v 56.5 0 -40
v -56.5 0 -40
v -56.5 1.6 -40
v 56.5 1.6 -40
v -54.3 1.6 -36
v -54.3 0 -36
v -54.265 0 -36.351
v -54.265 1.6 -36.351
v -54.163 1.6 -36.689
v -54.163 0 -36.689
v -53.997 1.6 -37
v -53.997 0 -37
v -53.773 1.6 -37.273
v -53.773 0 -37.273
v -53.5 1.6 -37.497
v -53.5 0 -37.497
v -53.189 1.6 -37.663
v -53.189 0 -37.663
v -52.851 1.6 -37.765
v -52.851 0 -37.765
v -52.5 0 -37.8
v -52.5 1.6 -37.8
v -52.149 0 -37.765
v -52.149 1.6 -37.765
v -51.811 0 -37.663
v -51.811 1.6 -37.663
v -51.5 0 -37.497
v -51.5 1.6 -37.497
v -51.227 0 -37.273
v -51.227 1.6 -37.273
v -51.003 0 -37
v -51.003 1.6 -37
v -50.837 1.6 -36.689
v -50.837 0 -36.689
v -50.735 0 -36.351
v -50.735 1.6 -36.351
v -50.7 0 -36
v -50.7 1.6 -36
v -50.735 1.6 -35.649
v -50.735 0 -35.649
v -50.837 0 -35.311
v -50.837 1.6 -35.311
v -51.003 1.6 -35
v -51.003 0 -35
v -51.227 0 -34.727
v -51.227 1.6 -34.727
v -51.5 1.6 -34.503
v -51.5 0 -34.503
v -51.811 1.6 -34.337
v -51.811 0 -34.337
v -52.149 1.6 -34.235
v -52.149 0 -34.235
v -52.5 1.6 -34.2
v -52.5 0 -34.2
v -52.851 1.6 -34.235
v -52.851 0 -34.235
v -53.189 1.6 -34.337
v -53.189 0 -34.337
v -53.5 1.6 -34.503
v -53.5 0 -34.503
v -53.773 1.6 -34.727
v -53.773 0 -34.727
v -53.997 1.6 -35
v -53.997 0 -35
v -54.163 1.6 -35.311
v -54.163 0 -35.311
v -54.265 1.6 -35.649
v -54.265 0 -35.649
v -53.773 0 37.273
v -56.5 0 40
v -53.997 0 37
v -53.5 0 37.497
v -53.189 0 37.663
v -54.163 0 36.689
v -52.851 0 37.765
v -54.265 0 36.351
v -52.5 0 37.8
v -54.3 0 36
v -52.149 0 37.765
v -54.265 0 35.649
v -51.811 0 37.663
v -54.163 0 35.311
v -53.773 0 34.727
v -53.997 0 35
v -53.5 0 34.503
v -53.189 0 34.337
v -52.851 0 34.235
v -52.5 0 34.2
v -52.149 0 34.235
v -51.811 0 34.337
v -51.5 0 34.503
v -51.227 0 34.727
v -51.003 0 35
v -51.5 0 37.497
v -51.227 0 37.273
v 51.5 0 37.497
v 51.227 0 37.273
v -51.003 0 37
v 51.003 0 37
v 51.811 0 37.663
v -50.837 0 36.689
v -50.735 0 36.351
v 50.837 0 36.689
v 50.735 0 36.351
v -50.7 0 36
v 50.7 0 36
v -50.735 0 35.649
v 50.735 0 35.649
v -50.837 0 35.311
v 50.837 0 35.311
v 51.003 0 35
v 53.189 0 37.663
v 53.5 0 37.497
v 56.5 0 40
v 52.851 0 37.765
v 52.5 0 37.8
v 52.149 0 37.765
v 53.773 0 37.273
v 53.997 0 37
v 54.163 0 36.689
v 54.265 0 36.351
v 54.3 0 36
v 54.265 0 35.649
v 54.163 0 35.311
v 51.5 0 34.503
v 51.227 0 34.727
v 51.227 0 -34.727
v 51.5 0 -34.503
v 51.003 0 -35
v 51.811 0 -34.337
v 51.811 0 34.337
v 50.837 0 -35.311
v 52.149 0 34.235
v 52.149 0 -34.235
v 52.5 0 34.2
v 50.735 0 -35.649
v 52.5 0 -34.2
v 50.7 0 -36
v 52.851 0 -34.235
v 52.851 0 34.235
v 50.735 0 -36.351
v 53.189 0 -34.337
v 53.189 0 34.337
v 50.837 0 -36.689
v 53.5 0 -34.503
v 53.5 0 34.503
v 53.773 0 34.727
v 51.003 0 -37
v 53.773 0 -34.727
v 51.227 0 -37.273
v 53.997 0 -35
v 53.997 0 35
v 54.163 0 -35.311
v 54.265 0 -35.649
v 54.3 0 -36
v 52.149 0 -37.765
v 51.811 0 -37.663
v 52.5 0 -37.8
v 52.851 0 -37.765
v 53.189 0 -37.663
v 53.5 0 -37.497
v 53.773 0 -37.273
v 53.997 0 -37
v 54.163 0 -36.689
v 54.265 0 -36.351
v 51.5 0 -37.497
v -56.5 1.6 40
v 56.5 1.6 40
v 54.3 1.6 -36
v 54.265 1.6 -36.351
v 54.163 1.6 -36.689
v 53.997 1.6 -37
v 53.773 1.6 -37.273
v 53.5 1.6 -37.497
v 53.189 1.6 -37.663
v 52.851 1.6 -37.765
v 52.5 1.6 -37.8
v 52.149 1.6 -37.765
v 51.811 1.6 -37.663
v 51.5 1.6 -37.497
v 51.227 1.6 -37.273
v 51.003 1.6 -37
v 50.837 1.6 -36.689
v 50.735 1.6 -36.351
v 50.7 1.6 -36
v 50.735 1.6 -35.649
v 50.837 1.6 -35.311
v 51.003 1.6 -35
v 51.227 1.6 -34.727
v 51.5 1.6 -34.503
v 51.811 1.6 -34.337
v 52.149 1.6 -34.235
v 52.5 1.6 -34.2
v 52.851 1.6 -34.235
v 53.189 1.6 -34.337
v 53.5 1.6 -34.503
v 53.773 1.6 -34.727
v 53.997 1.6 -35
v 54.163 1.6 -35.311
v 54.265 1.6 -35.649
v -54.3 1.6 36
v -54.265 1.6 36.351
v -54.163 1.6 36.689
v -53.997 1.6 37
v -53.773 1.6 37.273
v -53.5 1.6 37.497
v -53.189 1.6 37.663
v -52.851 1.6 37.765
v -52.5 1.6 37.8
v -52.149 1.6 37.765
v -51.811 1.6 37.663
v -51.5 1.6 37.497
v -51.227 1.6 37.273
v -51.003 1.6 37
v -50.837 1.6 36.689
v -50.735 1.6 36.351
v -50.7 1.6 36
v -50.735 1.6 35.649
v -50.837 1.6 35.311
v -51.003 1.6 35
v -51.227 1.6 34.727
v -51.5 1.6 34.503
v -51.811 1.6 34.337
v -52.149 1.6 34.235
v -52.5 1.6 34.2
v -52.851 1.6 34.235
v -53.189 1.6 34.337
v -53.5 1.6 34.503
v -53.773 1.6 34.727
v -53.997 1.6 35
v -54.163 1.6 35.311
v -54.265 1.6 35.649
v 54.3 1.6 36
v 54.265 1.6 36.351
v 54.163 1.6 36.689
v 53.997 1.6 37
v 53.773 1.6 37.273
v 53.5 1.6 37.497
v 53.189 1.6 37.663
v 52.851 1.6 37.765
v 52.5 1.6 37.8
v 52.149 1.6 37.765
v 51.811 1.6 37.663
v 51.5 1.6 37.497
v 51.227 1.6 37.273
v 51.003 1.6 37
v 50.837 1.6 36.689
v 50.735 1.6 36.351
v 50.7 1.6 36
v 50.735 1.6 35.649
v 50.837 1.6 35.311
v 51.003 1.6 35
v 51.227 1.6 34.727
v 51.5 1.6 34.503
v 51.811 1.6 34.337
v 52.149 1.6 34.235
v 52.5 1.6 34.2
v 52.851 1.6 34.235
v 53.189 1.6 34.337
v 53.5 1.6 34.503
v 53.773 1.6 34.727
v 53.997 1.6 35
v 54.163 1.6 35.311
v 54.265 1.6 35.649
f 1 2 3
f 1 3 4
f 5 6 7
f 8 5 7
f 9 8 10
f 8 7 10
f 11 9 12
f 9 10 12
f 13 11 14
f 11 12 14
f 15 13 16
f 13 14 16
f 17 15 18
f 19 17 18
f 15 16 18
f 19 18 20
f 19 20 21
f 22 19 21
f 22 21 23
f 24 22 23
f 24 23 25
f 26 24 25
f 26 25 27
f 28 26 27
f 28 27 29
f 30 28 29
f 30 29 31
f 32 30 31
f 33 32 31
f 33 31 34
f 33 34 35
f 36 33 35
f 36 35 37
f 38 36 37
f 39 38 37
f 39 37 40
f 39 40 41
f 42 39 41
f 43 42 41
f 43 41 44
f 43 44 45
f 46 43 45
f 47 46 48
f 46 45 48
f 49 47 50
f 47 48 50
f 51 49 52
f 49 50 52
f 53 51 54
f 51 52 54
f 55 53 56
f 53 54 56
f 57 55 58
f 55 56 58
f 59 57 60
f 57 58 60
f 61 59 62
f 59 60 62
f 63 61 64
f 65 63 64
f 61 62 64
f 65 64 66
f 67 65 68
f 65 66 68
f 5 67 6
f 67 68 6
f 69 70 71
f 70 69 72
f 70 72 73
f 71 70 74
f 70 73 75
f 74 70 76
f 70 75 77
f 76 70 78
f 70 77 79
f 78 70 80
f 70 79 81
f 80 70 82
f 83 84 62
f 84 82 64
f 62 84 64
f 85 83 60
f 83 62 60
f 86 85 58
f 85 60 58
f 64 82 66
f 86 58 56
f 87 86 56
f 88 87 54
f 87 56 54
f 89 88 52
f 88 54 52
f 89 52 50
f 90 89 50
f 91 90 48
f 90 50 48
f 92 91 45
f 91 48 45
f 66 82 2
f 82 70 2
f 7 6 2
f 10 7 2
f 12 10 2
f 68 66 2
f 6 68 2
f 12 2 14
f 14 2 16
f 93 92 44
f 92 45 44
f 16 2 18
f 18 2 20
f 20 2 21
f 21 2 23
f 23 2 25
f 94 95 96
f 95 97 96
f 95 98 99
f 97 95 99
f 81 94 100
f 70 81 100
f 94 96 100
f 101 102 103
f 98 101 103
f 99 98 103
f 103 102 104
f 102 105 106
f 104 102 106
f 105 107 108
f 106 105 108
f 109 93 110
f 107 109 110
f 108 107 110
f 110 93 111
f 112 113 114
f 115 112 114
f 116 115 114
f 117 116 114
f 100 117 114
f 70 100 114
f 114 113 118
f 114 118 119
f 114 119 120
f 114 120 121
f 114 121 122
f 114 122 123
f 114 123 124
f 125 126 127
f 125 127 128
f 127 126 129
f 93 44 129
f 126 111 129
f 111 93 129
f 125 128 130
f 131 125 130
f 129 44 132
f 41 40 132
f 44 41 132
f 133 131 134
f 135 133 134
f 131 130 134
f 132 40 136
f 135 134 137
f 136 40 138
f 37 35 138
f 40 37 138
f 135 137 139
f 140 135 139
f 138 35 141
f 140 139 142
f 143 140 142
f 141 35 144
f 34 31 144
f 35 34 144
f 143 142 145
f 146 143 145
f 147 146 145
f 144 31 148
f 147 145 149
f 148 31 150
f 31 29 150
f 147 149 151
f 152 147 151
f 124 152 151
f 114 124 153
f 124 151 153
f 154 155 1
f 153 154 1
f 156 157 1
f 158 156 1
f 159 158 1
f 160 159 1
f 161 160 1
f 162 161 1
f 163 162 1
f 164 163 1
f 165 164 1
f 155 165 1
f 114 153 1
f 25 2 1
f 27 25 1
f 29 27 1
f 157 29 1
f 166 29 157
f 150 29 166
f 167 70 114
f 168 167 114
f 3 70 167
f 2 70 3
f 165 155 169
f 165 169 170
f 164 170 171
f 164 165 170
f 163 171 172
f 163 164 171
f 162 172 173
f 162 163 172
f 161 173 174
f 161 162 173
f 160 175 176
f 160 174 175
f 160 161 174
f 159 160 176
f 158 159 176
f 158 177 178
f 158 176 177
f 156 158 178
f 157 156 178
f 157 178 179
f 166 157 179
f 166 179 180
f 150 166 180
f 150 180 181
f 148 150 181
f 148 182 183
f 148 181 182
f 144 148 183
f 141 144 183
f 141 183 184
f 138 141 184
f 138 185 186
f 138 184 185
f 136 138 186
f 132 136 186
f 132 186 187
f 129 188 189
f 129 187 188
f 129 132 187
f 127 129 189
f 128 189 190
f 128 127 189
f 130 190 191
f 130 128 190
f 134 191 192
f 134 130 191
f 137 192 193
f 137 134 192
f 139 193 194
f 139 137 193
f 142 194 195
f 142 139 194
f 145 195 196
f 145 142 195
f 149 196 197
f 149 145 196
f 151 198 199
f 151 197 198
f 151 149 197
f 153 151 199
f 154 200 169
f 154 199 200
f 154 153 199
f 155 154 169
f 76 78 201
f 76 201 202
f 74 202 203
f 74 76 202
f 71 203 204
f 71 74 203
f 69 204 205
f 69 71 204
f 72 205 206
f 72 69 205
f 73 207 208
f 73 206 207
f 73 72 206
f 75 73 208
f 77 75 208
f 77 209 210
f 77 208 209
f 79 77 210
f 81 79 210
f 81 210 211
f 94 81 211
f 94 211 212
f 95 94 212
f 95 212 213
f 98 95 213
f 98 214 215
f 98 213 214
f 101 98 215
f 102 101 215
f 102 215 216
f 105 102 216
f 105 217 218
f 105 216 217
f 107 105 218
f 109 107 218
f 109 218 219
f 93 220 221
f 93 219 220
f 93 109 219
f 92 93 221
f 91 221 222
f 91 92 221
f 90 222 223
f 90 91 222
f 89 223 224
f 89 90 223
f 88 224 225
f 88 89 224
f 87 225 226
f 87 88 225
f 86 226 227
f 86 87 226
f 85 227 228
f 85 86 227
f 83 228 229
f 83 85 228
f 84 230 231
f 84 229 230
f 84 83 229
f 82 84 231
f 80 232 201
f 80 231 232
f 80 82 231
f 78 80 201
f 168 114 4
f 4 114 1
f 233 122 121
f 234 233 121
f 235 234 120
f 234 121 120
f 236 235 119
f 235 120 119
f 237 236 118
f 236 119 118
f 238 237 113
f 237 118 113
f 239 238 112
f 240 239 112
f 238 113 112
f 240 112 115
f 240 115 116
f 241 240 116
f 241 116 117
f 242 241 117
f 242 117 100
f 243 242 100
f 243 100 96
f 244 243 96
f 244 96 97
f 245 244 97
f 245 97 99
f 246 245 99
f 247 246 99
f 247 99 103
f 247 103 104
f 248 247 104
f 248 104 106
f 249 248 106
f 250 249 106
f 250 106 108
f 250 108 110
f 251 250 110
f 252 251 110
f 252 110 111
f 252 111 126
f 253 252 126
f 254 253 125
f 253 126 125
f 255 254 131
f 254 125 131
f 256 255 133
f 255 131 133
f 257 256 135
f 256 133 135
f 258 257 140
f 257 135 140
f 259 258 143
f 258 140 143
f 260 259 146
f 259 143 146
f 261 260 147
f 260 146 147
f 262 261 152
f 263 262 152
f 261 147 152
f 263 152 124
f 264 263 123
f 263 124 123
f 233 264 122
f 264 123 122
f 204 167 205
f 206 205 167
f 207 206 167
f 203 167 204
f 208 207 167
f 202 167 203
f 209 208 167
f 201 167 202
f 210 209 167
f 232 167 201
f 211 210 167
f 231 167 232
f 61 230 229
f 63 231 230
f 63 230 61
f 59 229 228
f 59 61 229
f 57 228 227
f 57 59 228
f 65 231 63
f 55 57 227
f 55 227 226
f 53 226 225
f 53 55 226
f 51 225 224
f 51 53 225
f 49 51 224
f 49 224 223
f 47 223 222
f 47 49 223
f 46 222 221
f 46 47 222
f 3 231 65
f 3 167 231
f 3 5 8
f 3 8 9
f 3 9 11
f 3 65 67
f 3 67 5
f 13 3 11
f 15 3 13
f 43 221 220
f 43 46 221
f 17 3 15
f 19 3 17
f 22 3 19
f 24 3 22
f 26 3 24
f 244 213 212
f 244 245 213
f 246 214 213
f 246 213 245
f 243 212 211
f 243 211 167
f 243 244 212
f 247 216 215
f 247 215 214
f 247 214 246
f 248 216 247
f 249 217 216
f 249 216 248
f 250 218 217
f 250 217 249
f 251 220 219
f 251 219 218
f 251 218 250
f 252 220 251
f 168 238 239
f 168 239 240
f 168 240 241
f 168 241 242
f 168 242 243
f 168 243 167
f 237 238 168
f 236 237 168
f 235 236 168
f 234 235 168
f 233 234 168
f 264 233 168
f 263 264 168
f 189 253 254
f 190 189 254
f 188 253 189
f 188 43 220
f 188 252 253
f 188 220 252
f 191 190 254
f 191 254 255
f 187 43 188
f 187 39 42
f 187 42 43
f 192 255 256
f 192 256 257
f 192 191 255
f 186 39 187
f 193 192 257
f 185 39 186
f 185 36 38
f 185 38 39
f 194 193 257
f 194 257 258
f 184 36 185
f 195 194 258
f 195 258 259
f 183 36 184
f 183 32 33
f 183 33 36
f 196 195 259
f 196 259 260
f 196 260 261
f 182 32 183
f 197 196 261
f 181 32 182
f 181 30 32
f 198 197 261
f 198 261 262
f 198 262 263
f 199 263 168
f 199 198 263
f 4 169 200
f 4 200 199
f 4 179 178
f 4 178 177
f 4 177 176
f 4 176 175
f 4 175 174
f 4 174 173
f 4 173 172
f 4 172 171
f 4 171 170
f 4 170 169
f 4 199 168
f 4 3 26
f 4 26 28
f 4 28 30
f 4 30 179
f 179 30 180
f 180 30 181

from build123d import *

# Parameters (mm, degrees)
SKETCH1_W            = 113
SKETCH1_H            = 80
BOSS_EXTRUDE1_DEPTH  = 1.6
M3_CLEARANCE_HOLE1_D = 3.6
MIRROR2_COPY_1_D     = 3.6


with BuildPart() as part:
    # Sketch1 → Boss-Extrude1 (new body)
    with BuildSketch(Plane(origin=(0, 0, 0), x_dir=(1, 0, 0), z_dir=(0, 1, 0))):
        Rectangle(SKETCH1_W, SKETCH1_H)
    extrude(amount=BOSS_EXTRUDE1_DEPTH)

    # M3 Clearance Hole1 (through all)
    with Locations(Plane(origin=(0, 1.6, 0), x_dir=(1, 0, 0), z_dir=(0, 1, 0))):
        with Locations((-52.5, 36)):
            m3_clearance_hole1 = Hole(M3_CLEARANCE_HOLE1_D / 2)

    # Mirror1: M3 Clearance Hole1 across plane
    add(m3_clearance_hole1.mirror(Plane(origin=(0, 0, 0), x_dir=(0, 0, 1), z_dir=(1, 0, 0))), mode=Mode.SUBTRACT)

    # Mirror2: M3 Clearance Hole1 across plane
    add(m3_clearance_hole1.mirror(Plane.XY), mode=Mode.SUBTRACT)

    # Mirror2 copy 1 (through all)
    with Locations(Plane(origin=(0, 1.6, 0), x_dir=(-1, 0, 0), z_dir=(0, 1, 0))):
        with Locations((-52.5, 36)):
            Hole(MIRROR2_COPY_1_D / 2)


solid = part.part
